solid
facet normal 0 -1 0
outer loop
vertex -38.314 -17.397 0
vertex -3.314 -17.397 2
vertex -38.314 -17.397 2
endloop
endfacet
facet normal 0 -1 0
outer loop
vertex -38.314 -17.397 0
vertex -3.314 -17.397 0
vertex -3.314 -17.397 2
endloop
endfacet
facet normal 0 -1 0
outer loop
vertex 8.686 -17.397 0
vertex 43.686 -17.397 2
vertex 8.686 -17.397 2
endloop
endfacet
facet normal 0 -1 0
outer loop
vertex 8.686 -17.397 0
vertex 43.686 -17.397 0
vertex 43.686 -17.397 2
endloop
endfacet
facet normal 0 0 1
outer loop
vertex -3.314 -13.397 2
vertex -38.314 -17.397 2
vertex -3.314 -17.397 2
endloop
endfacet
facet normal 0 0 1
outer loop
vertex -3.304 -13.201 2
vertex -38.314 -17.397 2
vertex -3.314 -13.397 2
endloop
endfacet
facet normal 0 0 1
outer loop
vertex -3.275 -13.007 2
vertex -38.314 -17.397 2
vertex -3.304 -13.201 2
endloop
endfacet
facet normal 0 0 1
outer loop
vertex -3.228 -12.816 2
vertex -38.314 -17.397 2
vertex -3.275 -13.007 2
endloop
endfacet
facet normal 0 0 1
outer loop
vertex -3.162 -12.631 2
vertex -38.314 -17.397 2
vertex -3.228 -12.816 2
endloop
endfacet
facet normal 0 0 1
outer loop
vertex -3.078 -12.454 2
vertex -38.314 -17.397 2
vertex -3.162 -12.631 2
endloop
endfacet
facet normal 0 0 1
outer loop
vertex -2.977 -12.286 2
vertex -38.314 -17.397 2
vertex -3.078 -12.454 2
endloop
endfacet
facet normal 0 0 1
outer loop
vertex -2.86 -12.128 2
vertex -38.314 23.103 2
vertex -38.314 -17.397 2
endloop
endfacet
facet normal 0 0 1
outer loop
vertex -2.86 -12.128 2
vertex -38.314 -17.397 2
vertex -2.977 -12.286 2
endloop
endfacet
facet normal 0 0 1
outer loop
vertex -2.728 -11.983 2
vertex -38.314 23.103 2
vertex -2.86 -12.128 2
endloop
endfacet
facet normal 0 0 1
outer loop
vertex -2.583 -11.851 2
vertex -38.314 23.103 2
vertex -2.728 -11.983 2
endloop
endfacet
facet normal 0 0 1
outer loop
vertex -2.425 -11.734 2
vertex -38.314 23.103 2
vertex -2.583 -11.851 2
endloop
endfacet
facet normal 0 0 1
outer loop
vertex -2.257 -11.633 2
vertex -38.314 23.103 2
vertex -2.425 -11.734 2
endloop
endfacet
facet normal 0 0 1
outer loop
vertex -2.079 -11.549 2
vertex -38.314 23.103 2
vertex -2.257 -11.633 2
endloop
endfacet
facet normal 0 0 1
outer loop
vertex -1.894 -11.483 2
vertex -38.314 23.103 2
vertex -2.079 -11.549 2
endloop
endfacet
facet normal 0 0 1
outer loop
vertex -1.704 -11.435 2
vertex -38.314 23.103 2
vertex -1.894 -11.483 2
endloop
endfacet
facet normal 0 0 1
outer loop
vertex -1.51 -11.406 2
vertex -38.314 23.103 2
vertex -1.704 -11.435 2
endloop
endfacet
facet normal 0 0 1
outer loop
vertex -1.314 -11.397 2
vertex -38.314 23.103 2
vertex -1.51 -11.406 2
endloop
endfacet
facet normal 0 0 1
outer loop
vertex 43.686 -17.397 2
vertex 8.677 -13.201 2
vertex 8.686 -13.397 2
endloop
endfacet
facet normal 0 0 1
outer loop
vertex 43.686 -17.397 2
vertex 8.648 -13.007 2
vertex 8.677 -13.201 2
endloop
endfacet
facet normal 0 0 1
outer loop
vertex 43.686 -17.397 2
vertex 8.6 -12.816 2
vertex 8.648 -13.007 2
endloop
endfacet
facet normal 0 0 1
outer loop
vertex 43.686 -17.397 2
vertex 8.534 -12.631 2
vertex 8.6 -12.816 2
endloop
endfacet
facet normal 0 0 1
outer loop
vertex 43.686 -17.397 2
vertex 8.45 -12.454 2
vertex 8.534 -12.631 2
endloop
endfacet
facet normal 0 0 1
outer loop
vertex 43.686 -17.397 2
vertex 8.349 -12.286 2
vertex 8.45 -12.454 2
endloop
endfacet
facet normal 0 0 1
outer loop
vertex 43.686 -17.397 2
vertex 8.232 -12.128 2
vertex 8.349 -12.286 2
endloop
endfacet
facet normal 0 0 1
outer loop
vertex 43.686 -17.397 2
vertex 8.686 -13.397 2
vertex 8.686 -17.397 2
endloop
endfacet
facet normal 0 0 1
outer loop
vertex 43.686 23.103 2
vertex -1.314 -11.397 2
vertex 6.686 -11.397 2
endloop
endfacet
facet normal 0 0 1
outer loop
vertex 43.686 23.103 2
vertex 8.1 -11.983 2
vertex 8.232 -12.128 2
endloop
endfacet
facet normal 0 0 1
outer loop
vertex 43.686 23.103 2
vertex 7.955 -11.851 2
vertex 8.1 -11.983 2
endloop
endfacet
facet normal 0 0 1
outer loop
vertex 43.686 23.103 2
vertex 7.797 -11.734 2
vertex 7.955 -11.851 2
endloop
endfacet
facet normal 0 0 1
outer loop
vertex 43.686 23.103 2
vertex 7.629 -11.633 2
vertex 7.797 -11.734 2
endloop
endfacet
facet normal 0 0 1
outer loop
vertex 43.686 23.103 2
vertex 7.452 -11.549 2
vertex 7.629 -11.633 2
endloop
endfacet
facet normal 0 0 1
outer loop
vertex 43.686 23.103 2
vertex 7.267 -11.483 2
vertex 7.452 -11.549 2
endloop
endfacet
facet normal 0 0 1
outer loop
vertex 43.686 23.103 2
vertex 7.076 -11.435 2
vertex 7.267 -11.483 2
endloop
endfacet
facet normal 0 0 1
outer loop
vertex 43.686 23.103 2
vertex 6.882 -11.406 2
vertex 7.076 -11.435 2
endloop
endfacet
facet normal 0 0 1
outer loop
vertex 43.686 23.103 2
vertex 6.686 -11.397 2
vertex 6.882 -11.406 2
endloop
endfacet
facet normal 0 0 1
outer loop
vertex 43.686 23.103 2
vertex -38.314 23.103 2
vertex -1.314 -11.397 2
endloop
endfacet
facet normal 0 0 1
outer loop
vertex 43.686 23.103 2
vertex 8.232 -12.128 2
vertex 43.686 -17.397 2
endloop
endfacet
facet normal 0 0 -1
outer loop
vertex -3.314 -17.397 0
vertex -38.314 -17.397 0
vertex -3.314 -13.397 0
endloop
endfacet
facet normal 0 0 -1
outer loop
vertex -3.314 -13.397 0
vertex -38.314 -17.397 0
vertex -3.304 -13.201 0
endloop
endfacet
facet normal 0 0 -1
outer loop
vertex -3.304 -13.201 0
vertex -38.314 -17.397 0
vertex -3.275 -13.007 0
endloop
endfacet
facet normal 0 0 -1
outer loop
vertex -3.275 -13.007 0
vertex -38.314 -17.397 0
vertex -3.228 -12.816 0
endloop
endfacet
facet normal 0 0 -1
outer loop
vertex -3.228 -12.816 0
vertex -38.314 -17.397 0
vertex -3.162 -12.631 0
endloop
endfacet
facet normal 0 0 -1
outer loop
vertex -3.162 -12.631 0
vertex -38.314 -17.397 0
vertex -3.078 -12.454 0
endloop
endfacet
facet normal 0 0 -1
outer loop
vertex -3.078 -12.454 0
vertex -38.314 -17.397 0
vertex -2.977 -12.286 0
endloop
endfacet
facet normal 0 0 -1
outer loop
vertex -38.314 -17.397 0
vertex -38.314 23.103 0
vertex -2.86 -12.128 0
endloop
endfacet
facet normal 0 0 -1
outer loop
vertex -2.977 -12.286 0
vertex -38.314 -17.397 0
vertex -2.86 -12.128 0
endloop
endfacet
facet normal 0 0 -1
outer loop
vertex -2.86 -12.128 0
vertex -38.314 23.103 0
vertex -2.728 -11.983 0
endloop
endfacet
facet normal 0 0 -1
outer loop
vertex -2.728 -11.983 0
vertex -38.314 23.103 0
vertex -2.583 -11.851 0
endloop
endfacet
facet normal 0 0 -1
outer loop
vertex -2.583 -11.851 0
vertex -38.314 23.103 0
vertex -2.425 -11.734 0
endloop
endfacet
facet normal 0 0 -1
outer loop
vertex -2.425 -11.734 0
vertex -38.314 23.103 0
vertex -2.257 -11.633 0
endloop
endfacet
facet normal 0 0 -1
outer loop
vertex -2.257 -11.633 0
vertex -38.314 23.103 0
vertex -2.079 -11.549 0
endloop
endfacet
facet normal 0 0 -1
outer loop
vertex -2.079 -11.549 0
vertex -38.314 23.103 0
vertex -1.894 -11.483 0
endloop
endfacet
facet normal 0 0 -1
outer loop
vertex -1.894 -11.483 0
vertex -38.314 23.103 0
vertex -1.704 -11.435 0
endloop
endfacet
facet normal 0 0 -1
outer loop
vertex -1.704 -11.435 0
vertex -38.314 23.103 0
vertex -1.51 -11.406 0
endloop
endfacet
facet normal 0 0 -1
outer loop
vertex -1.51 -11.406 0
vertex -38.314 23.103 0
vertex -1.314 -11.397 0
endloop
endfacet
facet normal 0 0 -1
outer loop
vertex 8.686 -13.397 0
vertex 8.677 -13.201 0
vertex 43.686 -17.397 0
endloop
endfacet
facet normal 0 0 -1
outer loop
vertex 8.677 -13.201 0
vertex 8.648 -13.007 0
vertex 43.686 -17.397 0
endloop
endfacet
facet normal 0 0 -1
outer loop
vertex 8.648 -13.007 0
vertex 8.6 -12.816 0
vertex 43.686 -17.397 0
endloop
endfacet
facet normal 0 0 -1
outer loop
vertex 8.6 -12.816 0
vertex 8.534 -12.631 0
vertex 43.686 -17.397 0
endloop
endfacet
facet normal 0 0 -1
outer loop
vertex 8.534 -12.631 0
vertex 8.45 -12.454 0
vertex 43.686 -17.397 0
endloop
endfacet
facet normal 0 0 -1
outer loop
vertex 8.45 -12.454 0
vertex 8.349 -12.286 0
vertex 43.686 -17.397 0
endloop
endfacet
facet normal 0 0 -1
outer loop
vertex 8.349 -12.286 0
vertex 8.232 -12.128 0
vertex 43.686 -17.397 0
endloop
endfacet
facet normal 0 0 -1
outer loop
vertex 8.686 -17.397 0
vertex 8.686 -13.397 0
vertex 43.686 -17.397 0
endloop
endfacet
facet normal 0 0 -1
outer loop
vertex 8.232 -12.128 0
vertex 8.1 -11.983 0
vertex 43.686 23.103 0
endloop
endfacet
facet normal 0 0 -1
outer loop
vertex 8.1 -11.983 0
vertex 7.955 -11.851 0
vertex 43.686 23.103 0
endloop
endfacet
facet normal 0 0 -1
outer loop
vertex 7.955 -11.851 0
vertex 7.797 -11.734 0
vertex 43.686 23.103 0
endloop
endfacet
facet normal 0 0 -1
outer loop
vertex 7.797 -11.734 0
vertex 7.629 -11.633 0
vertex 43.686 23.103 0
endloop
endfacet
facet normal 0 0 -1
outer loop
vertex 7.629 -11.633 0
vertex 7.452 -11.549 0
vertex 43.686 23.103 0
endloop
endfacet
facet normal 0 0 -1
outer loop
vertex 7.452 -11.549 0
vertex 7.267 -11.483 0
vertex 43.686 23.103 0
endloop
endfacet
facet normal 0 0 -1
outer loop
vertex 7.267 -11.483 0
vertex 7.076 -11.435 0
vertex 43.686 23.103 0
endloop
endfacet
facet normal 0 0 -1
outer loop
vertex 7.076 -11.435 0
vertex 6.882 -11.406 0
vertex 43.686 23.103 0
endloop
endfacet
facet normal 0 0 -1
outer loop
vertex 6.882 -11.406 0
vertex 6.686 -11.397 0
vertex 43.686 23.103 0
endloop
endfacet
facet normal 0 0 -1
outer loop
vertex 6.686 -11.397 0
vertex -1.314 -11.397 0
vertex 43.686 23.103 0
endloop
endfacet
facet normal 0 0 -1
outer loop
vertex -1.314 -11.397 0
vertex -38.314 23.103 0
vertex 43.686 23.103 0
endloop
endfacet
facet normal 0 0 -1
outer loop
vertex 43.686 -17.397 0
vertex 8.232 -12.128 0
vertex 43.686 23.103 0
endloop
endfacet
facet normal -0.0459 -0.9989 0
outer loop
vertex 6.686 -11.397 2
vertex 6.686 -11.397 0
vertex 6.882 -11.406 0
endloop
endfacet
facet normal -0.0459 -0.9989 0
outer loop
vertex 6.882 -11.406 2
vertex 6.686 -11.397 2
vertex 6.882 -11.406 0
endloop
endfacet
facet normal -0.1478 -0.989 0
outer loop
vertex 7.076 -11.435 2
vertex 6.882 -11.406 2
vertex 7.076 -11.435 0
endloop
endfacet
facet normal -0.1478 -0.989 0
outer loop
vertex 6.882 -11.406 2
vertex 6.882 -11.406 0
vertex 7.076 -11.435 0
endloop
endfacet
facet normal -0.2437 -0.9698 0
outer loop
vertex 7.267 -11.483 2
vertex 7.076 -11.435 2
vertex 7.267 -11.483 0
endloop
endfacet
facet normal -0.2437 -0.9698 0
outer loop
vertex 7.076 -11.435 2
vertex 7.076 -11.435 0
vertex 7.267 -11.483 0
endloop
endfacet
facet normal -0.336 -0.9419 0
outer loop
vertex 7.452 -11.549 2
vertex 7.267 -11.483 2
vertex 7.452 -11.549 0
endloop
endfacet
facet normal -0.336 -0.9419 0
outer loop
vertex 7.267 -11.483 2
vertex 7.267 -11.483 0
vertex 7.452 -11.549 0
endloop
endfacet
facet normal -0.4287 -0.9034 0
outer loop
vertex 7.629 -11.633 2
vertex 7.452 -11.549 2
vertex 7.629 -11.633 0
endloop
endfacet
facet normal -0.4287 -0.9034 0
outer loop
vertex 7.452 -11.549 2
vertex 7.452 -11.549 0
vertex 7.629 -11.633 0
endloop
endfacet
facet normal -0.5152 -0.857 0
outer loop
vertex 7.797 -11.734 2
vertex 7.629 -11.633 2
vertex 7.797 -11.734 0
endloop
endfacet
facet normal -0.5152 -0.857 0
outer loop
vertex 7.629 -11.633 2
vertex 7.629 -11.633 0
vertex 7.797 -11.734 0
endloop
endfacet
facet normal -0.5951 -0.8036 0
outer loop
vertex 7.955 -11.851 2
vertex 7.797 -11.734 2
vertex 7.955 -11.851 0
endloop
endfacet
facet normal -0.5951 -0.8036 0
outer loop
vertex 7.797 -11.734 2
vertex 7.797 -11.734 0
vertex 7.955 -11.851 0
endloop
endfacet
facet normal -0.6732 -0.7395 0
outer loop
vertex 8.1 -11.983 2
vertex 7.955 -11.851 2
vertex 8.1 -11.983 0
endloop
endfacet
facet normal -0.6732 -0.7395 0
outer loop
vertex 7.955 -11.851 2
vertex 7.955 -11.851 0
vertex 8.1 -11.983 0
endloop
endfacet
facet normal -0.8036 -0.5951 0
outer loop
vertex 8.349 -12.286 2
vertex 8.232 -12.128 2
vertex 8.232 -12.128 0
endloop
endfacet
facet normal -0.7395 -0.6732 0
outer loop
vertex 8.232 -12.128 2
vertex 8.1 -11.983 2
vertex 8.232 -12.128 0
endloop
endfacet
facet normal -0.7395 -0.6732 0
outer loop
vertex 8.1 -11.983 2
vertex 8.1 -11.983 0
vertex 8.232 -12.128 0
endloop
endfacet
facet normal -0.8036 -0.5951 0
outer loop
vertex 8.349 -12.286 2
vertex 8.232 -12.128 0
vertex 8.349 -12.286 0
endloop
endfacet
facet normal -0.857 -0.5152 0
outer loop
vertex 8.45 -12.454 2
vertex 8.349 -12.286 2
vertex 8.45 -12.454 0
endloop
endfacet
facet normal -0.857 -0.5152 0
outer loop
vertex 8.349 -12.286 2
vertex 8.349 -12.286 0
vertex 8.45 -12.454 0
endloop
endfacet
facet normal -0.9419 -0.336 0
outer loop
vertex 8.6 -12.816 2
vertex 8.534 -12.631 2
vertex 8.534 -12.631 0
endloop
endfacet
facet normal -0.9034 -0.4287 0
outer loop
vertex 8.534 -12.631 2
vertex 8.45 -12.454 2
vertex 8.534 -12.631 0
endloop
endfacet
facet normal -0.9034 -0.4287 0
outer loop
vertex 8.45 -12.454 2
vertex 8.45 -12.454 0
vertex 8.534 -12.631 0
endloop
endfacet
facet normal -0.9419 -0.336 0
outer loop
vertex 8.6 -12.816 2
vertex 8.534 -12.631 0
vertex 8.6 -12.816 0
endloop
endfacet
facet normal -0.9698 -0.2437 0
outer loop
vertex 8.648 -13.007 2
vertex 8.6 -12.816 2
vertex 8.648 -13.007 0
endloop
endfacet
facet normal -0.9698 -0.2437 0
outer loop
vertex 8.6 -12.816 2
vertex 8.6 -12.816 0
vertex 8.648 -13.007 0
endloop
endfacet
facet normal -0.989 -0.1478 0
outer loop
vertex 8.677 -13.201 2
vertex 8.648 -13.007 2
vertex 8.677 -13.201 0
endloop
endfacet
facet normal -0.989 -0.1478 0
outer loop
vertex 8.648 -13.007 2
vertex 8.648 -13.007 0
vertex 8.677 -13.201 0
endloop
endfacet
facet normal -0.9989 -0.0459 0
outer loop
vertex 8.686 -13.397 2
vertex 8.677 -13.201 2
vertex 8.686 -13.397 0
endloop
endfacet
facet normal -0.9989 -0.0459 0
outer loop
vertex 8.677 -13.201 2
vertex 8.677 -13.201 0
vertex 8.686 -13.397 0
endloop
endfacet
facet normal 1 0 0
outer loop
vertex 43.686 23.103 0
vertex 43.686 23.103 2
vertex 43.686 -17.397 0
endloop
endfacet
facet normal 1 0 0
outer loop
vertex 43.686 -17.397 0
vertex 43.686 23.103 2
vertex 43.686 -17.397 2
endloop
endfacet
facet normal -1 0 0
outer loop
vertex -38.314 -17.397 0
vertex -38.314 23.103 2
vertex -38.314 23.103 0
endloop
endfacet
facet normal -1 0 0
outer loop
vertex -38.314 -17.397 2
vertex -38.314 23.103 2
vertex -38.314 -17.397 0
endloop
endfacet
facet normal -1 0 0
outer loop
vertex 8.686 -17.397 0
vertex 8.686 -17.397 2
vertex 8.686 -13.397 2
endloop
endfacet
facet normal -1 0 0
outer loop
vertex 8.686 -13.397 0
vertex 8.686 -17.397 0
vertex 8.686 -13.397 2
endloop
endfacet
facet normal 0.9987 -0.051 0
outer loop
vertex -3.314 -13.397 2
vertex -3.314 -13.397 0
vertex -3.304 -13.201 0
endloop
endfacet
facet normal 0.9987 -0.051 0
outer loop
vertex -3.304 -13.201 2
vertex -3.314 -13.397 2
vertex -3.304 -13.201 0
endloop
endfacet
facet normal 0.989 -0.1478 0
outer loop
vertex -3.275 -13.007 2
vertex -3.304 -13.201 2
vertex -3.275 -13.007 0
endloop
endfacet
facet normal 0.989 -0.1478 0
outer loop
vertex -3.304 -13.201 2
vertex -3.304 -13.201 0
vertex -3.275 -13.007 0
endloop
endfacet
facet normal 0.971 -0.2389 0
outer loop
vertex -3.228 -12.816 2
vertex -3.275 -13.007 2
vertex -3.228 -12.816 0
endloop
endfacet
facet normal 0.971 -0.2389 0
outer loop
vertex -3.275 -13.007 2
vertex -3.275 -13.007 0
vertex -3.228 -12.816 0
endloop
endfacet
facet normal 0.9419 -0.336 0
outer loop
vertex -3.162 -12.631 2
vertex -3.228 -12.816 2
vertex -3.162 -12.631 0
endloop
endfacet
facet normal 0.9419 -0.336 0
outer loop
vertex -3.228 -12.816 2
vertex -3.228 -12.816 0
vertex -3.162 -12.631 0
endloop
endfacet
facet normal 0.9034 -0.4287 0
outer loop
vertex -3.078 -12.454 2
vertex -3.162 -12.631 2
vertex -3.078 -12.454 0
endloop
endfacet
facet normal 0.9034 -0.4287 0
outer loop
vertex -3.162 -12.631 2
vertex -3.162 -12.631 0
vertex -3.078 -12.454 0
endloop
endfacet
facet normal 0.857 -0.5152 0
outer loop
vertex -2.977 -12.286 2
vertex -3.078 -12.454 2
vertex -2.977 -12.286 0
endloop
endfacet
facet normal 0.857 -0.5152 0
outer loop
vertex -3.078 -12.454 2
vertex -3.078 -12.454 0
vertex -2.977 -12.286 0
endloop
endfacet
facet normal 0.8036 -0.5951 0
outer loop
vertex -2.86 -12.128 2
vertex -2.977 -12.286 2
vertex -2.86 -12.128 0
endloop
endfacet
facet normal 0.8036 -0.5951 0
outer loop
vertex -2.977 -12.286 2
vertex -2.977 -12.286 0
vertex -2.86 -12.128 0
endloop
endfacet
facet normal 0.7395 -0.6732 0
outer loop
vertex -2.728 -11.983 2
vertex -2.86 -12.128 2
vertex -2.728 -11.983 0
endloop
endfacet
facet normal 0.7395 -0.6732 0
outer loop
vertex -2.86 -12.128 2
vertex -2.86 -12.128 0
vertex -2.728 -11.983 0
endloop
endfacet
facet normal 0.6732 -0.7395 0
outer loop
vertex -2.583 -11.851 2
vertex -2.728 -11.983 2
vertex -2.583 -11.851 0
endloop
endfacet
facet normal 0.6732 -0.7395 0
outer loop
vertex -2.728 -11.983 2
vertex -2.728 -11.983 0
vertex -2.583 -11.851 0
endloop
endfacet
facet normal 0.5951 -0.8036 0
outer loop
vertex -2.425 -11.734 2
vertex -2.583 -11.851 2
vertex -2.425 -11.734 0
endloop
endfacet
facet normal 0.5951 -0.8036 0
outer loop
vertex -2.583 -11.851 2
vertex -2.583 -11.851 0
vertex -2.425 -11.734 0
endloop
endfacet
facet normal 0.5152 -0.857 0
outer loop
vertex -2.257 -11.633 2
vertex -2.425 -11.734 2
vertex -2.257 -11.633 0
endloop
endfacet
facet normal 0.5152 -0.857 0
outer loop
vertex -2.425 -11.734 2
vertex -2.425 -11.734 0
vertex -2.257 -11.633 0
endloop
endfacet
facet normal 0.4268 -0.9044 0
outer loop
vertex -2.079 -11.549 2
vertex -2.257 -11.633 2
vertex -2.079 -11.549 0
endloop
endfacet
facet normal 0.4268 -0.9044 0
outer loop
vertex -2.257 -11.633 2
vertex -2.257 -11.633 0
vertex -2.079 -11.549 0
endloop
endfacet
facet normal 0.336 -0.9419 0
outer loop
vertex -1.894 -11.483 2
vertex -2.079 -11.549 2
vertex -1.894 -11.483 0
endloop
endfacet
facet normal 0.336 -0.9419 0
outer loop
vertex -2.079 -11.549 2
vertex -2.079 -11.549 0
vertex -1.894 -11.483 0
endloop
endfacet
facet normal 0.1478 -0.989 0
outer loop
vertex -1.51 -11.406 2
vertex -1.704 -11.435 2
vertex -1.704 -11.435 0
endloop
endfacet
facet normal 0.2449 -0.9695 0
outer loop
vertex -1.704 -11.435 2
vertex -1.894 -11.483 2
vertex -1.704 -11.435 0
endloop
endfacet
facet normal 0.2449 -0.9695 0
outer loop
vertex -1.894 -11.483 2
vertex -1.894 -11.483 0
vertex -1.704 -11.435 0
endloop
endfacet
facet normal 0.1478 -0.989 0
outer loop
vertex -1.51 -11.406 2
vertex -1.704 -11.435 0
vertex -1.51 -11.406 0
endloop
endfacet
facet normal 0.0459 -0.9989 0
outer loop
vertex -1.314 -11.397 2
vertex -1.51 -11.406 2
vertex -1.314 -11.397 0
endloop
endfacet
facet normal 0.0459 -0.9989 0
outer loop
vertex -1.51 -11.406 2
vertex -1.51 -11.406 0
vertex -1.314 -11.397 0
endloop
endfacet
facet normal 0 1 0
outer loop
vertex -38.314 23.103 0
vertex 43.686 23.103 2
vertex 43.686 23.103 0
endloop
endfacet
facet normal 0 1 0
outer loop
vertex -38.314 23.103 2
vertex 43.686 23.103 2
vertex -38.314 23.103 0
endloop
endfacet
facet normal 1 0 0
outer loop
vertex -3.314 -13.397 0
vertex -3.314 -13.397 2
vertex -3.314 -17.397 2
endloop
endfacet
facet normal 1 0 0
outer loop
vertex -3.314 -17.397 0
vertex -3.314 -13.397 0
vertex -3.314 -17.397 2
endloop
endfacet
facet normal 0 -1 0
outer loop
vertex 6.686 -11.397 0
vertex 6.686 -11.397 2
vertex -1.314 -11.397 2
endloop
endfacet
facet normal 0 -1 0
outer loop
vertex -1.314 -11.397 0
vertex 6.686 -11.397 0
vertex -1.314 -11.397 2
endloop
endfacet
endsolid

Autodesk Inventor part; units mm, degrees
ref_plane "YZ Plane" through (0, 0, 0) normal (1, 0, 0) x (0, 1, 0)
ref_plane "XZ Plane" through (0, 0, 0) normal (0, 1, 0) x (-1, 0, 0)
ref_plane "XY Plane" through (0, 0, 0) normal (0, 0, 1) x (1, 0, 0)
sketch "Sketch1" plane through (0, 0, 0) normal (0, 0, 1) x (1, 0, 0)
  line L0 (-40.3138, 25.1032) -> (45.6862, 25.1032)
  line L1 (45.6862, 25.1032) -> (45.6862, -17.3968)
  line L2 (45.6862, -17.3968) -> (-40.3138, -17.3968)
  line L3 (-40.3138, -17.3968) -> (-40.3138, 25.1032)
  point P0 (0, 0)
  dimension "d0" = 86
  dimension "d1" = 42.5
extrude "Extrusion1" add sketch "Sketch1" along normal blind 2
sketch "Sketch2" plane through (0, 0, 2) normal (0, 0, 1) x (1, 0, 0)
  line L0 (-40.3138, -17.3968) -> (45.6862, -17.3968) projected
  line L1 (-3.3138, -17.3968) -> (8.6862, -17.3968)
  line L2 (8.6862, -17.3968) -> (8.6862, -11.3968)
  line L3 (8.6862, -11.3968) -> (-3.3138, -11.3968)
  line L4 (-3.3138, -11.3968) -> (-3.3138, -17.3968)
  line L5 (-40.3138, 25.1032) -> (-40.3138, -17.3968) projected
  line L6 (45.6862, -17.3968) -> (45.6862, 25.1032) projected
  point P0 (0, 0)
  dimension "d4" = 6
  dimension "d5" = 12
  dimension "d6" = 37
  dimension "d7" = 86
extrude "Extrusion2" cut sketch "Sketch2" against normal blind 2
fillet "Fillet1" radius 2 2 edges at (-3.3138, -11.3968, 1) (8.6862, -11.3968, 1)
sketch "Sketch3" plane through (0, 0, 2) normal (0, 0, 1) x (1, 0, 0)
  line L0 (45.6862, 25.1032) -> (-40.3138, 25.1032) projected
  line L1 (45.6862, -17.3968) -> (45.6862, 25.1032) projected
  line L2 (-40.3138, 25.1032) -> (45.6862, 25.1032)
  line L3 (45.6862, 25.1032) -> (45.6862, 23.1032)
  line L4 (45.6862, 23.1032) -> (-40.3138, 23.1032)
  line L5 (-40.3138, 23.1032) -> (-40.3138, 25.1032)
  point P0 (0, 0)
  dimension "d11" = 2
extrude "Extrusion3" cut sketch "Sketch3" against normal blind 2
sketch "Sketch4" plane through (0, 0, 2) normal (0, 0, 1) x (1, 0, 0)
  line L0 (-40.3138, 23.1032) -> (-40.3138, -17.3968) projected
  line L1 (-40.3138, -17.3968) -> (-3.3138, -17.3968) projected
  line L2 (-40.3138, 23.1032) -> (-38.3138, 23.1032)
  line L3 (-38.3138, 23.1032) -> (-38.3138, -17.3968)
  line L4 (-38.3138, -17.3968) -> (-40.3138, -17.3968)
  line L5 (-40.3138, -17.3968) -> (-40.3138, 23.1032)
  line L6 (8.6862, -17.3968) -> (45.6862, -17.3968) projected
  line L7 (45.6862, 23.1032) -> (43.6862, 23.1032)
  line L8 (43.6862, 23.1032) -> (43.6862, -17.3968)
  line L9 (43.6862, -17.3968) -> (45.6862, -17.3968)
  line L10 (45.6862, -17.3968) -> (45.6862, 23.1032)
  line L11 (45.6862, -17.3968) -> (45.6862, 23.1032) projected
  point P0 (0, 0)
  dimension "d14" = 2
  dimension "d15" = 2
extrude "Extrusion4" cut sketch "Sketch4" against normal blind 2
properties part number "front-panel"
